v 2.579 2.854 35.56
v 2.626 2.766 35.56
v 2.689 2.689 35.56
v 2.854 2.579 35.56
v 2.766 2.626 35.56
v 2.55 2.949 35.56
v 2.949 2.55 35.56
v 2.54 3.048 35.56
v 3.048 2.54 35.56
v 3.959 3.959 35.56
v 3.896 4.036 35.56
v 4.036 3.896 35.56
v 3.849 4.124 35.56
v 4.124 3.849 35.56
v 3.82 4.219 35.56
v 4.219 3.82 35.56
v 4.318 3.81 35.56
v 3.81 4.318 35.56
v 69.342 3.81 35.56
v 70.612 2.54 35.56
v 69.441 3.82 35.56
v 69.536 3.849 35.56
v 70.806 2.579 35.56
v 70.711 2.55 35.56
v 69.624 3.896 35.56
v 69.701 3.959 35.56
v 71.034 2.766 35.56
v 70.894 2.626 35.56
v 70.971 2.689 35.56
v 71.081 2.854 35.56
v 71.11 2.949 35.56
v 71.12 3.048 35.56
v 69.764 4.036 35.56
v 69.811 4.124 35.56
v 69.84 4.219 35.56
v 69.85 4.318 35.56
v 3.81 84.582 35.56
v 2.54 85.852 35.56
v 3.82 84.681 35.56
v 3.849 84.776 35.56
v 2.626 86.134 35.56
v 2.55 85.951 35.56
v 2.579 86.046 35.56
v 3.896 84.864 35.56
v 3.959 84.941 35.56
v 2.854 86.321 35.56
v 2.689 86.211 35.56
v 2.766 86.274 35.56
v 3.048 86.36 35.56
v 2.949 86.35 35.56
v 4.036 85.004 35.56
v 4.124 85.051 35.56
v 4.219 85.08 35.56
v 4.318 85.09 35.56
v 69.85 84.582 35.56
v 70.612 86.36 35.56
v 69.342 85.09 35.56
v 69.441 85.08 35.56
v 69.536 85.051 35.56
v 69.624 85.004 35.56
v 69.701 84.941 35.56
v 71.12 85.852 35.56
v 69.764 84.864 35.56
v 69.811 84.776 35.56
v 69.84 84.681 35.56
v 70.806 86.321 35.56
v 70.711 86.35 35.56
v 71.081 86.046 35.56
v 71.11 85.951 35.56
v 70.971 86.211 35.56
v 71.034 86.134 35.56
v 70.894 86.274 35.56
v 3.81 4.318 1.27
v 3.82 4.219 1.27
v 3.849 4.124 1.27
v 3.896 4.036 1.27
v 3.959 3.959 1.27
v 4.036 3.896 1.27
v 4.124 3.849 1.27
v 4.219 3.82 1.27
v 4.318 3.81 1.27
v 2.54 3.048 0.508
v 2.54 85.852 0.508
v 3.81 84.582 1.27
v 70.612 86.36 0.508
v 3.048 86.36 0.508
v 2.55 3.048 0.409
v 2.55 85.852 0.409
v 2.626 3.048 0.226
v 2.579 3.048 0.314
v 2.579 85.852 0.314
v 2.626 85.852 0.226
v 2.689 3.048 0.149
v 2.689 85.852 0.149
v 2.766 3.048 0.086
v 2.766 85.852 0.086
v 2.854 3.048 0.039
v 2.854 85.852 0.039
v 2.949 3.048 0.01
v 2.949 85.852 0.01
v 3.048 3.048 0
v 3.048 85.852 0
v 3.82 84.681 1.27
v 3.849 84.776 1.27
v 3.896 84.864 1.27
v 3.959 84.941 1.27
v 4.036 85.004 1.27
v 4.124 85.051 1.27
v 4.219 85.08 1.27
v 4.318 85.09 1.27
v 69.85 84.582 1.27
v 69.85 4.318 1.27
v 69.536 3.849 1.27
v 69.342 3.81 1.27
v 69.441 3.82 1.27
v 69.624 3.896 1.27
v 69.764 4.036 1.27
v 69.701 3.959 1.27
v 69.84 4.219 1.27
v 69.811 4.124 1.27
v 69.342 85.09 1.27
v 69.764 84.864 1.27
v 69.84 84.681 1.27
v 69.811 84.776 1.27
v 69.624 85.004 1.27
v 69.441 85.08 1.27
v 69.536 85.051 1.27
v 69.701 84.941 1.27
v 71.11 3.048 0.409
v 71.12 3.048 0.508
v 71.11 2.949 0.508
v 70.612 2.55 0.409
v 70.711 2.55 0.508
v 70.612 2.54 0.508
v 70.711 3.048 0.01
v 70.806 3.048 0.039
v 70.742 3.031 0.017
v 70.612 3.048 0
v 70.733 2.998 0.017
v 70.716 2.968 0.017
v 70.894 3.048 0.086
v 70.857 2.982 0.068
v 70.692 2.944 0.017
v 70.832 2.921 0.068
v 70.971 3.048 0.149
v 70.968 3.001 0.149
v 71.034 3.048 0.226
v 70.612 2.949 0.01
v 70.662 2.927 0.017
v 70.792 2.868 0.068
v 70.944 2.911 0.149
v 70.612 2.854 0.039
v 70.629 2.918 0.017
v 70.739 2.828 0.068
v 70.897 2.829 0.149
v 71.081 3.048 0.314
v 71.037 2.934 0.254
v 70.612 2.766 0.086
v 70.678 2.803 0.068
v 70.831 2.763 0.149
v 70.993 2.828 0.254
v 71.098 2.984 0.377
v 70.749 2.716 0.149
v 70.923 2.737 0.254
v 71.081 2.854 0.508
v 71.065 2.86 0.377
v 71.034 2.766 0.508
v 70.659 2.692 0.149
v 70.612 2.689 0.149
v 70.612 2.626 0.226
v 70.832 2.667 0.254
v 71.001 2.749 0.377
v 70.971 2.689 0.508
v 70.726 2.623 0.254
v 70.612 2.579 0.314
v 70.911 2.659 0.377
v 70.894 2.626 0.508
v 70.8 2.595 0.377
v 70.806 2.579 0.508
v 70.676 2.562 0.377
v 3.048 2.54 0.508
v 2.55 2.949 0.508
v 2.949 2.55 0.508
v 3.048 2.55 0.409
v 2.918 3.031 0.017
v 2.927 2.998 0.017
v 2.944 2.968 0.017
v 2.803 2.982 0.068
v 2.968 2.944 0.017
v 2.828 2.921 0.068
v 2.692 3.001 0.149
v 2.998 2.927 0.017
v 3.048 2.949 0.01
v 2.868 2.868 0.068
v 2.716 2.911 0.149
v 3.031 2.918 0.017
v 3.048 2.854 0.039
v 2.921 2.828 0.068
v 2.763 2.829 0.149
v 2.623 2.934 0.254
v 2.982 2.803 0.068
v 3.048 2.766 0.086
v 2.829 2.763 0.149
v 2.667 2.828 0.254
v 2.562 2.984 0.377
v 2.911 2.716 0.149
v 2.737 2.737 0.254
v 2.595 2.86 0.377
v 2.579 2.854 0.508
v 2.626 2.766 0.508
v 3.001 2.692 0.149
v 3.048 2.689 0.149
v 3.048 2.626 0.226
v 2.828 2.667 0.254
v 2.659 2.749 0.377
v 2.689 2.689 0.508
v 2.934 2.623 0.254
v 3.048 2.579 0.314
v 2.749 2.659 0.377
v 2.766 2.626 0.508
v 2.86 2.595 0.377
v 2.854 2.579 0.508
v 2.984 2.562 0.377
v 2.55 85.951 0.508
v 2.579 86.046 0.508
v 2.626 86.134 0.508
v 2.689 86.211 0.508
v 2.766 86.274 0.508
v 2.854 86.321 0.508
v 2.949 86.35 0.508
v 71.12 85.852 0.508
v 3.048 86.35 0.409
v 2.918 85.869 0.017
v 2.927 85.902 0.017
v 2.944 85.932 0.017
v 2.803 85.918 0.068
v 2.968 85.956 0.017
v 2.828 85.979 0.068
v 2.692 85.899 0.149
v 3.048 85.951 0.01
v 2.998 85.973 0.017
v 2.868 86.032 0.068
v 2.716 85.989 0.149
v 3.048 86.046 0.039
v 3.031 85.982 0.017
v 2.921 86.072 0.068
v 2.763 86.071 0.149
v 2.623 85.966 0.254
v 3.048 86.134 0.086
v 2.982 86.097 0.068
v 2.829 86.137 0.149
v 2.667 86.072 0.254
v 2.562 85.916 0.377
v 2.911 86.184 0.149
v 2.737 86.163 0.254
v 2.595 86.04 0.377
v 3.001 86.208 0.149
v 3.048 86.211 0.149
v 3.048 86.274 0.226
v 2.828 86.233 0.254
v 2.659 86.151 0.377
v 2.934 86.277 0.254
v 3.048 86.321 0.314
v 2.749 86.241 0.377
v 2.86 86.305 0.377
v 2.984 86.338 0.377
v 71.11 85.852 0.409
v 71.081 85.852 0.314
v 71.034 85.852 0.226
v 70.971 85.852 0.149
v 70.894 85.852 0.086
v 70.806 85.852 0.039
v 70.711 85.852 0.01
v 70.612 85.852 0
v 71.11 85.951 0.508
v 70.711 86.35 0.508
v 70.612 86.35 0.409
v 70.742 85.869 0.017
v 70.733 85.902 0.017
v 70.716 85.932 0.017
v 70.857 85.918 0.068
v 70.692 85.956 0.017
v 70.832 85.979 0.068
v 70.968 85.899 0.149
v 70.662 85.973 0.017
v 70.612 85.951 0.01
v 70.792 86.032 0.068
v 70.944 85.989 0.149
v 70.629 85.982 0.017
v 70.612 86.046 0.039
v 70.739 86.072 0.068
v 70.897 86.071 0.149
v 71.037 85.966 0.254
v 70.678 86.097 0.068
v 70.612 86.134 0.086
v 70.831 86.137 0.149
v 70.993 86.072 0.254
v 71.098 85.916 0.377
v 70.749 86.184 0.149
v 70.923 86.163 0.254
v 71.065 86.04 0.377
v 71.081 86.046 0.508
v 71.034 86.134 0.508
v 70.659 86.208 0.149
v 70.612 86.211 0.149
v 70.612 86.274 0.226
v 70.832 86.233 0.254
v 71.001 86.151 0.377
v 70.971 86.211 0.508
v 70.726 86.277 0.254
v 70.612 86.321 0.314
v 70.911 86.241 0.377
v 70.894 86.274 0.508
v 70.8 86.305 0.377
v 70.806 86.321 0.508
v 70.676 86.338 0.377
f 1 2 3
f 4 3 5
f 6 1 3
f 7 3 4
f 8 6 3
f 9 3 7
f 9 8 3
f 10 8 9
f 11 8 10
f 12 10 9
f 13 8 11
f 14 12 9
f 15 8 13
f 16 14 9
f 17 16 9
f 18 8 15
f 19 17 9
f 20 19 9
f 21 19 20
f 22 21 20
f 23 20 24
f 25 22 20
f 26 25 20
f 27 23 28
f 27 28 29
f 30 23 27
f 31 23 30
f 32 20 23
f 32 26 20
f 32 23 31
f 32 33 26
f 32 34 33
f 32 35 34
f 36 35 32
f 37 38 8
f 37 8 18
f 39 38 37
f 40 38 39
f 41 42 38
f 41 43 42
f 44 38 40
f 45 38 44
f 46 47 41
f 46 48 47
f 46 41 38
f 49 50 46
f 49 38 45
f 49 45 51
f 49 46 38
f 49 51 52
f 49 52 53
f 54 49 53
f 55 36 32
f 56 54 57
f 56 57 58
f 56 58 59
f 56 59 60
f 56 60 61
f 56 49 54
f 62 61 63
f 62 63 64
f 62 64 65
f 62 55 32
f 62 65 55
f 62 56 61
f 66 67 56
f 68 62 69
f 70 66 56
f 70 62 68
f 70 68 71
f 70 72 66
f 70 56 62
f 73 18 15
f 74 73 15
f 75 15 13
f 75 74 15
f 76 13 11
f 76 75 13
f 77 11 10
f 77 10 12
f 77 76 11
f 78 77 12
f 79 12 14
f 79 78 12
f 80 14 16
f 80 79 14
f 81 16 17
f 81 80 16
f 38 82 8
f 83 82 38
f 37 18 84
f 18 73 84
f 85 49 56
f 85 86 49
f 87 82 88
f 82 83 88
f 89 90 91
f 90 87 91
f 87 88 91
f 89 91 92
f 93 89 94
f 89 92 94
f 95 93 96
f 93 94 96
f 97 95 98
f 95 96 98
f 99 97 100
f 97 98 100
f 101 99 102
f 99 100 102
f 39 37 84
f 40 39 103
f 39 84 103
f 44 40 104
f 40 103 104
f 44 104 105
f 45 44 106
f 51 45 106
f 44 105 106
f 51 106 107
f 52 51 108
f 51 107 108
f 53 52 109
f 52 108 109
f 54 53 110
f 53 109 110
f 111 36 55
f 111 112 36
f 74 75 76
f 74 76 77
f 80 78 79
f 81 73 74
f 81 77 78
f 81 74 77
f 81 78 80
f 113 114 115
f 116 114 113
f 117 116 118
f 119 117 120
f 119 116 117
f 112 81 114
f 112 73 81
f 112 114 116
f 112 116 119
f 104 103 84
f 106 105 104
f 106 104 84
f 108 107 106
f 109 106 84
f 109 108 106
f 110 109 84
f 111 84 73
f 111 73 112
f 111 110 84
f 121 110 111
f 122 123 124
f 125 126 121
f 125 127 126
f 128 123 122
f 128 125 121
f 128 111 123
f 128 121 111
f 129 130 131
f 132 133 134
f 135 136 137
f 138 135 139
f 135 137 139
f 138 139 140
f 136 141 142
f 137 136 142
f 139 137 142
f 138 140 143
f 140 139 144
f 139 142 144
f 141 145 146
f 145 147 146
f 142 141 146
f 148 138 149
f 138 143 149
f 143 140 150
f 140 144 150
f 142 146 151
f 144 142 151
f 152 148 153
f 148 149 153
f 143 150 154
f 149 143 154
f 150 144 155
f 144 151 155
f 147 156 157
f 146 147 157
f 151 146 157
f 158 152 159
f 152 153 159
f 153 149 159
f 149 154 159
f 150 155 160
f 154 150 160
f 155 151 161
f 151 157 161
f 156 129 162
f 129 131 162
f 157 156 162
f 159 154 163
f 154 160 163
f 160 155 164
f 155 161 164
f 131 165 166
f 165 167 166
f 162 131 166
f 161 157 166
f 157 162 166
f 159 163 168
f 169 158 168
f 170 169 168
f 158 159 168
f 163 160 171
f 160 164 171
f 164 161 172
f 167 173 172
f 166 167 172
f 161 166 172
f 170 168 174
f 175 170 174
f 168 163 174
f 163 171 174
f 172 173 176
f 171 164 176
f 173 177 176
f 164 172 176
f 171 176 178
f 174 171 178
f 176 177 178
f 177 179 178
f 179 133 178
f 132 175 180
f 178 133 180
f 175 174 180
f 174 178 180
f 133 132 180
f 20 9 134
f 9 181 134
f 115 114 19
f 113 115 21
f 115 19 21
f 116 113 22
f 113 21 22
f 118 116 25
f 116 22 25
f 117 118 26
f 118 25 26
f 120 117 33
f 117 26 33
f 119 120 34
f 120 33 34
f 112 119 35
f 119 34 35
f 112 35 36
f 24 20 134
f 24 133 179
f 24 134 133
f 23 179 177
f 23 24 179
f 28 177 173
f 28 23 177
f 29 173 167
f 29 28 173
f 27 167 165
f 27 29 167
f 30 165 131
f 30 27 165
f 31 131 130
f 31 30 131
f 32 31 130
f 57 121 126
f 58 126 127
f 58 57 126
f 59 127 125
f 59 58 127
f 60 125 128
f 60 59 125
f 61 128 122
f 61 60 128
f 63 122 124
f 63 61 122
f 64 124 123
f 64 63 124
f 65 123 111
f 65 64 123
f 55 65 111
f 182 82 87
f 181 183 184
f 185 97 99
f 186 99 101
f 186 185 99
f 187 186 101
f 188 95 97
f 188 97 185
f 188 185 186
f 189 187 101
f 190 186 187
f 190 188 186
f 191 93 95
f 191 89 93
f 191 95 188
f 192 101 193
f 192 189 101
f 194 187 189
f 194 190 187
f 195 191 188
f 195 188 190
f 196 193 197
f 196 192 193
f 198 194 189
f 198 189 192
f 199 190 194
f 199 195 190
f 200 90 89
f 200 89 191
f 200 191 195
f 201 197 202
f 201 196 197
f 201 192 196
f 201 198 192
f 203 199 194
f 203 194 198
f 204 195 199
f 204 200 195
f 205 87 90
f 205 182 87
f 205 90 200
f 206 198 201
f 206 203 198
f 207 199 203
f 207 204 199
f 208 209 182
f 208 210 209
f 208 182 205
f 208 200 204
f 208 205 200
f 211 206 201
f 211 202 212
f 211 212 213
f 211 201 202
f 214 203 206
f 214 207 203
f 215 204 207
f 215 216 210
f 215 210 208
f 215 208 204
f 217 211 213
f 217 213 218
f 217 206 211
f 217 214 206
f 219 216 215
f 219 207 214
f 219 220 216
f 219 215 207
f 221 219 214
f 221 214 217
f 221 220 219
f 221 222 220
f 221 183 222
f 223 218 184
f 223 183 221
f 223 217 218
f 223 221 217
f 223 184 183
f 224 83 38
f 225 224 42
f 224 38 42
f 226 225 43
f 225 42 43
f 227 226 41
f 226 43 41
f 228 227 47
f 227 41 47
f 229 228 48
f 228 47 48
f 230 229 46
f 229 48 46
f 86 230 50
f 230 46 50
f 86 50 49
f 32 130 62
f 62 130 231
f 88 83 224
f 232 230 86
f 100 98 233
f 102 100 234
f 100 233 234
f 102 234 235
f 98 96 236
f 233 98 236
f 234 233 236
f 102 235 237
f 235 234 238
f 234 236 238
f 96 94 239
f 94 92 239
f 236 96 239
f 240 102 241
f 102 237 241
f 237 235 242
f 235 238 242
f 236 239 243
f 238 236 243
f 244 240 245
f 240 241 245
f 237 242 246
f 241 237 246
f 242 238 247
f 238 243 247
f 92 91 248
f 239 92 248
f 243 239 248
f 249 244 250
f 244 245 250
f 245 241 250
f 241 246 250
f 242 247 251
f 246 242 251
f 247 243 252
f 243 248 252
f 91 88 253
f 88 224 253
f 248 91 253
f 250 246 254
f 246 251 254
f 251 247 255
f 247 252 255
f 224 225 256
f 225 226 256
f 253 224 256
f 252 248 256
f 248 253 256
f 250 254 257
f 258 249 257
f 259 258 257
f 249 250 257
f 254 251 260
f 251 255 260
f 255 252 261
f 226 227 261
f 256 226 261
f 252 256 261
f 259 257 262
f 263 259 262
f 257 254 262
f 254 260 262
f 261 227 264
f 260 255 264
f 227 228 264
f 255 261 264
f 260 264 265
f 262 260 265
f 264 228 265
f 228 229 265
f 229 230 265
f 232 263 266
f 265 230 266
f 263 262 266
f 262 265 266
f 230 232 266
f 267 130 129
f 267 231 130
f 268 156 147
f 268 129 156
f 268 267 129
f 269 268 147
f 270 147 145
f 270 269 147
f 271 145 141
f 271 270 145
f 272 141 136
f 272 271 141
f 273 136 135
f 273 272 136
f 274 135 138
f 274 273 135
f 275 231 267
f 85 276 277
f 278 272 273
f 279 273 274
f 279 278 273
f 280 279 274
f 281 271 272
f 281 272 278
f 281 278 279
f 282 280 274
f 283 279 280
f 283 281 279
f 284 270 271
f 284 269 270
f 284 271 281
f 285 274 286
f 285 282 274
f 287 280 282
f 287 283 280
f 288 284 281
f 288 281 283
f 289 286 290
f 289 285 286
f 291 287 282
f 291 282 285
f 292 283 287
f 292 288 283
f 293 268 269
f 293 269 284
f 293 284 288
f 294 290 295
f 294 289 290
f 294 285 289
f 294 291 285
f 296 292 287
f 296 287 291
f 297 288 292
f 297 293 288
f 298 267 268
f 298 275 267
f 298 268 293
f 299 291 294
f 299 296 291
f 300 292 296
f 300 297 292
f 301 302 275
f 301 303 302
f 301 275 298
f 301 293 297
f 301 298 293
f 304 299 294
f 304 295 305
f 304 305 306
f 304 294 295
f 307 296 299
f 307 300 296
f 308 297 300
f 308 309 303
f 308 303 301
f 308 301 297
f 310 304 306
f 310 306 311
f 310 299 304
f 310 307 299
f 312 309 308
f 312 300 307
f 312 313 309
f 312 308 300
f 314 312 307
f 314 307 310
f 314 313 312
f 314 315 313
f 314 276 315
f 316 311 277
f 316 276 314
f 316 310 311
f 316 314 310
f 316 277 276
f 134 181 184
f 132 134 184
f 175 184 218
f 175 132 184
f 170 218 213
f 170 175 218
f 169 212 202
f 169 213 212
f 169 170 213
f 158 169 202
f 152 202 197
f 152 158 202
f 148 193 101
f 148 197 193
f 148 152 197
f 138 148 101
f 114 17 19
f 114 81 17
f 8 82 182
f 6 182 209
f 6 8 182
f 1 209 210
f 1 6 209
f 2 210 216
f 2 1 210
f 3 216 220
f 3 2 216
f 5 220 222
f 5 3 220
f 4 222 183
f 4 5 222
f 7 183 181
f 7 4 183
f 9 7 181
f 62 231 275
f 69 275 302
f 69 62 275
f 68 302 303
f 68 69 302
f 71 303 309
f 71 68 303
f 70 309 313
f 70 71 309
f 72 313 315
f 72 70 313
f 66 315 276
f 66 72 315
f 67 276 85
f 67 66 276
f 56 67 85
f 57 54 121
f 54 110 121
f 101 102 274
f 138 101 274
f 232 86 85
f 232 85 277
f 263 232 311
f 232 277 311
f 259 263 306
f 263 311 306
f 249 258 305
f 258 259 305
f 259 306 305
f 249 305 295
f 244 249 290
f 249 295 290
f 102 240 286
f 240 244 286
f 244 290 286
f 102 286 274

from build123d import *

# Parameters (mm, degrees)
F0_W     = 68.58
F0_H     = 83.82
F1_DEPTH = 35.56
F2_R     = 0.508
F3_T     = -1.27
F4_R     = 0.508


with BuildPart() as f1:
    # F0 (on Top) → F1 (new body)
    with BuildSketch(Plane.XY):
        with Locations((36.83, 44.45)):
            Rectangle(F0_W, F0_H)
    extrude(amount=F1_DEPTH)

    # F2
    f2_edges = [f1.edges().sort_by_distance(p)[0] for p in [
        (71.12, 2.54, 17.78),
        (71.12, 86.36, 17.78),
        (2.54, 2.54, 17.78),
        (2.54, 86.36, 17.78),
        (71.12, 44.45, 0),
        (2.54, 44.45, 0),
        (36.83, 2.54, 0),
        (36.83, 86.36, 0),
    ]]
    fillet(f2_edges, radius=F2_R)

    # F3
    f3_openings = [f1.faces().sort_by_distance(p)[0] for p in [
        (36.83, 44.45, 35.56),
    ]]
    offset(amount=F3_T, openings=f3_openings)

    # F4
    f4_edges = [f1.edges().sort_by_distance(p)[0] for p in [
        (3.81, 3.81, 18.415),
        (3.81, 85.09, 18.415),
        (69.85, 85.09, 18.415),
        (69.85, 3.81, 18.415),
    ]]
    fillet(f4_edges, radius=F4_R)


solid = f1.part
